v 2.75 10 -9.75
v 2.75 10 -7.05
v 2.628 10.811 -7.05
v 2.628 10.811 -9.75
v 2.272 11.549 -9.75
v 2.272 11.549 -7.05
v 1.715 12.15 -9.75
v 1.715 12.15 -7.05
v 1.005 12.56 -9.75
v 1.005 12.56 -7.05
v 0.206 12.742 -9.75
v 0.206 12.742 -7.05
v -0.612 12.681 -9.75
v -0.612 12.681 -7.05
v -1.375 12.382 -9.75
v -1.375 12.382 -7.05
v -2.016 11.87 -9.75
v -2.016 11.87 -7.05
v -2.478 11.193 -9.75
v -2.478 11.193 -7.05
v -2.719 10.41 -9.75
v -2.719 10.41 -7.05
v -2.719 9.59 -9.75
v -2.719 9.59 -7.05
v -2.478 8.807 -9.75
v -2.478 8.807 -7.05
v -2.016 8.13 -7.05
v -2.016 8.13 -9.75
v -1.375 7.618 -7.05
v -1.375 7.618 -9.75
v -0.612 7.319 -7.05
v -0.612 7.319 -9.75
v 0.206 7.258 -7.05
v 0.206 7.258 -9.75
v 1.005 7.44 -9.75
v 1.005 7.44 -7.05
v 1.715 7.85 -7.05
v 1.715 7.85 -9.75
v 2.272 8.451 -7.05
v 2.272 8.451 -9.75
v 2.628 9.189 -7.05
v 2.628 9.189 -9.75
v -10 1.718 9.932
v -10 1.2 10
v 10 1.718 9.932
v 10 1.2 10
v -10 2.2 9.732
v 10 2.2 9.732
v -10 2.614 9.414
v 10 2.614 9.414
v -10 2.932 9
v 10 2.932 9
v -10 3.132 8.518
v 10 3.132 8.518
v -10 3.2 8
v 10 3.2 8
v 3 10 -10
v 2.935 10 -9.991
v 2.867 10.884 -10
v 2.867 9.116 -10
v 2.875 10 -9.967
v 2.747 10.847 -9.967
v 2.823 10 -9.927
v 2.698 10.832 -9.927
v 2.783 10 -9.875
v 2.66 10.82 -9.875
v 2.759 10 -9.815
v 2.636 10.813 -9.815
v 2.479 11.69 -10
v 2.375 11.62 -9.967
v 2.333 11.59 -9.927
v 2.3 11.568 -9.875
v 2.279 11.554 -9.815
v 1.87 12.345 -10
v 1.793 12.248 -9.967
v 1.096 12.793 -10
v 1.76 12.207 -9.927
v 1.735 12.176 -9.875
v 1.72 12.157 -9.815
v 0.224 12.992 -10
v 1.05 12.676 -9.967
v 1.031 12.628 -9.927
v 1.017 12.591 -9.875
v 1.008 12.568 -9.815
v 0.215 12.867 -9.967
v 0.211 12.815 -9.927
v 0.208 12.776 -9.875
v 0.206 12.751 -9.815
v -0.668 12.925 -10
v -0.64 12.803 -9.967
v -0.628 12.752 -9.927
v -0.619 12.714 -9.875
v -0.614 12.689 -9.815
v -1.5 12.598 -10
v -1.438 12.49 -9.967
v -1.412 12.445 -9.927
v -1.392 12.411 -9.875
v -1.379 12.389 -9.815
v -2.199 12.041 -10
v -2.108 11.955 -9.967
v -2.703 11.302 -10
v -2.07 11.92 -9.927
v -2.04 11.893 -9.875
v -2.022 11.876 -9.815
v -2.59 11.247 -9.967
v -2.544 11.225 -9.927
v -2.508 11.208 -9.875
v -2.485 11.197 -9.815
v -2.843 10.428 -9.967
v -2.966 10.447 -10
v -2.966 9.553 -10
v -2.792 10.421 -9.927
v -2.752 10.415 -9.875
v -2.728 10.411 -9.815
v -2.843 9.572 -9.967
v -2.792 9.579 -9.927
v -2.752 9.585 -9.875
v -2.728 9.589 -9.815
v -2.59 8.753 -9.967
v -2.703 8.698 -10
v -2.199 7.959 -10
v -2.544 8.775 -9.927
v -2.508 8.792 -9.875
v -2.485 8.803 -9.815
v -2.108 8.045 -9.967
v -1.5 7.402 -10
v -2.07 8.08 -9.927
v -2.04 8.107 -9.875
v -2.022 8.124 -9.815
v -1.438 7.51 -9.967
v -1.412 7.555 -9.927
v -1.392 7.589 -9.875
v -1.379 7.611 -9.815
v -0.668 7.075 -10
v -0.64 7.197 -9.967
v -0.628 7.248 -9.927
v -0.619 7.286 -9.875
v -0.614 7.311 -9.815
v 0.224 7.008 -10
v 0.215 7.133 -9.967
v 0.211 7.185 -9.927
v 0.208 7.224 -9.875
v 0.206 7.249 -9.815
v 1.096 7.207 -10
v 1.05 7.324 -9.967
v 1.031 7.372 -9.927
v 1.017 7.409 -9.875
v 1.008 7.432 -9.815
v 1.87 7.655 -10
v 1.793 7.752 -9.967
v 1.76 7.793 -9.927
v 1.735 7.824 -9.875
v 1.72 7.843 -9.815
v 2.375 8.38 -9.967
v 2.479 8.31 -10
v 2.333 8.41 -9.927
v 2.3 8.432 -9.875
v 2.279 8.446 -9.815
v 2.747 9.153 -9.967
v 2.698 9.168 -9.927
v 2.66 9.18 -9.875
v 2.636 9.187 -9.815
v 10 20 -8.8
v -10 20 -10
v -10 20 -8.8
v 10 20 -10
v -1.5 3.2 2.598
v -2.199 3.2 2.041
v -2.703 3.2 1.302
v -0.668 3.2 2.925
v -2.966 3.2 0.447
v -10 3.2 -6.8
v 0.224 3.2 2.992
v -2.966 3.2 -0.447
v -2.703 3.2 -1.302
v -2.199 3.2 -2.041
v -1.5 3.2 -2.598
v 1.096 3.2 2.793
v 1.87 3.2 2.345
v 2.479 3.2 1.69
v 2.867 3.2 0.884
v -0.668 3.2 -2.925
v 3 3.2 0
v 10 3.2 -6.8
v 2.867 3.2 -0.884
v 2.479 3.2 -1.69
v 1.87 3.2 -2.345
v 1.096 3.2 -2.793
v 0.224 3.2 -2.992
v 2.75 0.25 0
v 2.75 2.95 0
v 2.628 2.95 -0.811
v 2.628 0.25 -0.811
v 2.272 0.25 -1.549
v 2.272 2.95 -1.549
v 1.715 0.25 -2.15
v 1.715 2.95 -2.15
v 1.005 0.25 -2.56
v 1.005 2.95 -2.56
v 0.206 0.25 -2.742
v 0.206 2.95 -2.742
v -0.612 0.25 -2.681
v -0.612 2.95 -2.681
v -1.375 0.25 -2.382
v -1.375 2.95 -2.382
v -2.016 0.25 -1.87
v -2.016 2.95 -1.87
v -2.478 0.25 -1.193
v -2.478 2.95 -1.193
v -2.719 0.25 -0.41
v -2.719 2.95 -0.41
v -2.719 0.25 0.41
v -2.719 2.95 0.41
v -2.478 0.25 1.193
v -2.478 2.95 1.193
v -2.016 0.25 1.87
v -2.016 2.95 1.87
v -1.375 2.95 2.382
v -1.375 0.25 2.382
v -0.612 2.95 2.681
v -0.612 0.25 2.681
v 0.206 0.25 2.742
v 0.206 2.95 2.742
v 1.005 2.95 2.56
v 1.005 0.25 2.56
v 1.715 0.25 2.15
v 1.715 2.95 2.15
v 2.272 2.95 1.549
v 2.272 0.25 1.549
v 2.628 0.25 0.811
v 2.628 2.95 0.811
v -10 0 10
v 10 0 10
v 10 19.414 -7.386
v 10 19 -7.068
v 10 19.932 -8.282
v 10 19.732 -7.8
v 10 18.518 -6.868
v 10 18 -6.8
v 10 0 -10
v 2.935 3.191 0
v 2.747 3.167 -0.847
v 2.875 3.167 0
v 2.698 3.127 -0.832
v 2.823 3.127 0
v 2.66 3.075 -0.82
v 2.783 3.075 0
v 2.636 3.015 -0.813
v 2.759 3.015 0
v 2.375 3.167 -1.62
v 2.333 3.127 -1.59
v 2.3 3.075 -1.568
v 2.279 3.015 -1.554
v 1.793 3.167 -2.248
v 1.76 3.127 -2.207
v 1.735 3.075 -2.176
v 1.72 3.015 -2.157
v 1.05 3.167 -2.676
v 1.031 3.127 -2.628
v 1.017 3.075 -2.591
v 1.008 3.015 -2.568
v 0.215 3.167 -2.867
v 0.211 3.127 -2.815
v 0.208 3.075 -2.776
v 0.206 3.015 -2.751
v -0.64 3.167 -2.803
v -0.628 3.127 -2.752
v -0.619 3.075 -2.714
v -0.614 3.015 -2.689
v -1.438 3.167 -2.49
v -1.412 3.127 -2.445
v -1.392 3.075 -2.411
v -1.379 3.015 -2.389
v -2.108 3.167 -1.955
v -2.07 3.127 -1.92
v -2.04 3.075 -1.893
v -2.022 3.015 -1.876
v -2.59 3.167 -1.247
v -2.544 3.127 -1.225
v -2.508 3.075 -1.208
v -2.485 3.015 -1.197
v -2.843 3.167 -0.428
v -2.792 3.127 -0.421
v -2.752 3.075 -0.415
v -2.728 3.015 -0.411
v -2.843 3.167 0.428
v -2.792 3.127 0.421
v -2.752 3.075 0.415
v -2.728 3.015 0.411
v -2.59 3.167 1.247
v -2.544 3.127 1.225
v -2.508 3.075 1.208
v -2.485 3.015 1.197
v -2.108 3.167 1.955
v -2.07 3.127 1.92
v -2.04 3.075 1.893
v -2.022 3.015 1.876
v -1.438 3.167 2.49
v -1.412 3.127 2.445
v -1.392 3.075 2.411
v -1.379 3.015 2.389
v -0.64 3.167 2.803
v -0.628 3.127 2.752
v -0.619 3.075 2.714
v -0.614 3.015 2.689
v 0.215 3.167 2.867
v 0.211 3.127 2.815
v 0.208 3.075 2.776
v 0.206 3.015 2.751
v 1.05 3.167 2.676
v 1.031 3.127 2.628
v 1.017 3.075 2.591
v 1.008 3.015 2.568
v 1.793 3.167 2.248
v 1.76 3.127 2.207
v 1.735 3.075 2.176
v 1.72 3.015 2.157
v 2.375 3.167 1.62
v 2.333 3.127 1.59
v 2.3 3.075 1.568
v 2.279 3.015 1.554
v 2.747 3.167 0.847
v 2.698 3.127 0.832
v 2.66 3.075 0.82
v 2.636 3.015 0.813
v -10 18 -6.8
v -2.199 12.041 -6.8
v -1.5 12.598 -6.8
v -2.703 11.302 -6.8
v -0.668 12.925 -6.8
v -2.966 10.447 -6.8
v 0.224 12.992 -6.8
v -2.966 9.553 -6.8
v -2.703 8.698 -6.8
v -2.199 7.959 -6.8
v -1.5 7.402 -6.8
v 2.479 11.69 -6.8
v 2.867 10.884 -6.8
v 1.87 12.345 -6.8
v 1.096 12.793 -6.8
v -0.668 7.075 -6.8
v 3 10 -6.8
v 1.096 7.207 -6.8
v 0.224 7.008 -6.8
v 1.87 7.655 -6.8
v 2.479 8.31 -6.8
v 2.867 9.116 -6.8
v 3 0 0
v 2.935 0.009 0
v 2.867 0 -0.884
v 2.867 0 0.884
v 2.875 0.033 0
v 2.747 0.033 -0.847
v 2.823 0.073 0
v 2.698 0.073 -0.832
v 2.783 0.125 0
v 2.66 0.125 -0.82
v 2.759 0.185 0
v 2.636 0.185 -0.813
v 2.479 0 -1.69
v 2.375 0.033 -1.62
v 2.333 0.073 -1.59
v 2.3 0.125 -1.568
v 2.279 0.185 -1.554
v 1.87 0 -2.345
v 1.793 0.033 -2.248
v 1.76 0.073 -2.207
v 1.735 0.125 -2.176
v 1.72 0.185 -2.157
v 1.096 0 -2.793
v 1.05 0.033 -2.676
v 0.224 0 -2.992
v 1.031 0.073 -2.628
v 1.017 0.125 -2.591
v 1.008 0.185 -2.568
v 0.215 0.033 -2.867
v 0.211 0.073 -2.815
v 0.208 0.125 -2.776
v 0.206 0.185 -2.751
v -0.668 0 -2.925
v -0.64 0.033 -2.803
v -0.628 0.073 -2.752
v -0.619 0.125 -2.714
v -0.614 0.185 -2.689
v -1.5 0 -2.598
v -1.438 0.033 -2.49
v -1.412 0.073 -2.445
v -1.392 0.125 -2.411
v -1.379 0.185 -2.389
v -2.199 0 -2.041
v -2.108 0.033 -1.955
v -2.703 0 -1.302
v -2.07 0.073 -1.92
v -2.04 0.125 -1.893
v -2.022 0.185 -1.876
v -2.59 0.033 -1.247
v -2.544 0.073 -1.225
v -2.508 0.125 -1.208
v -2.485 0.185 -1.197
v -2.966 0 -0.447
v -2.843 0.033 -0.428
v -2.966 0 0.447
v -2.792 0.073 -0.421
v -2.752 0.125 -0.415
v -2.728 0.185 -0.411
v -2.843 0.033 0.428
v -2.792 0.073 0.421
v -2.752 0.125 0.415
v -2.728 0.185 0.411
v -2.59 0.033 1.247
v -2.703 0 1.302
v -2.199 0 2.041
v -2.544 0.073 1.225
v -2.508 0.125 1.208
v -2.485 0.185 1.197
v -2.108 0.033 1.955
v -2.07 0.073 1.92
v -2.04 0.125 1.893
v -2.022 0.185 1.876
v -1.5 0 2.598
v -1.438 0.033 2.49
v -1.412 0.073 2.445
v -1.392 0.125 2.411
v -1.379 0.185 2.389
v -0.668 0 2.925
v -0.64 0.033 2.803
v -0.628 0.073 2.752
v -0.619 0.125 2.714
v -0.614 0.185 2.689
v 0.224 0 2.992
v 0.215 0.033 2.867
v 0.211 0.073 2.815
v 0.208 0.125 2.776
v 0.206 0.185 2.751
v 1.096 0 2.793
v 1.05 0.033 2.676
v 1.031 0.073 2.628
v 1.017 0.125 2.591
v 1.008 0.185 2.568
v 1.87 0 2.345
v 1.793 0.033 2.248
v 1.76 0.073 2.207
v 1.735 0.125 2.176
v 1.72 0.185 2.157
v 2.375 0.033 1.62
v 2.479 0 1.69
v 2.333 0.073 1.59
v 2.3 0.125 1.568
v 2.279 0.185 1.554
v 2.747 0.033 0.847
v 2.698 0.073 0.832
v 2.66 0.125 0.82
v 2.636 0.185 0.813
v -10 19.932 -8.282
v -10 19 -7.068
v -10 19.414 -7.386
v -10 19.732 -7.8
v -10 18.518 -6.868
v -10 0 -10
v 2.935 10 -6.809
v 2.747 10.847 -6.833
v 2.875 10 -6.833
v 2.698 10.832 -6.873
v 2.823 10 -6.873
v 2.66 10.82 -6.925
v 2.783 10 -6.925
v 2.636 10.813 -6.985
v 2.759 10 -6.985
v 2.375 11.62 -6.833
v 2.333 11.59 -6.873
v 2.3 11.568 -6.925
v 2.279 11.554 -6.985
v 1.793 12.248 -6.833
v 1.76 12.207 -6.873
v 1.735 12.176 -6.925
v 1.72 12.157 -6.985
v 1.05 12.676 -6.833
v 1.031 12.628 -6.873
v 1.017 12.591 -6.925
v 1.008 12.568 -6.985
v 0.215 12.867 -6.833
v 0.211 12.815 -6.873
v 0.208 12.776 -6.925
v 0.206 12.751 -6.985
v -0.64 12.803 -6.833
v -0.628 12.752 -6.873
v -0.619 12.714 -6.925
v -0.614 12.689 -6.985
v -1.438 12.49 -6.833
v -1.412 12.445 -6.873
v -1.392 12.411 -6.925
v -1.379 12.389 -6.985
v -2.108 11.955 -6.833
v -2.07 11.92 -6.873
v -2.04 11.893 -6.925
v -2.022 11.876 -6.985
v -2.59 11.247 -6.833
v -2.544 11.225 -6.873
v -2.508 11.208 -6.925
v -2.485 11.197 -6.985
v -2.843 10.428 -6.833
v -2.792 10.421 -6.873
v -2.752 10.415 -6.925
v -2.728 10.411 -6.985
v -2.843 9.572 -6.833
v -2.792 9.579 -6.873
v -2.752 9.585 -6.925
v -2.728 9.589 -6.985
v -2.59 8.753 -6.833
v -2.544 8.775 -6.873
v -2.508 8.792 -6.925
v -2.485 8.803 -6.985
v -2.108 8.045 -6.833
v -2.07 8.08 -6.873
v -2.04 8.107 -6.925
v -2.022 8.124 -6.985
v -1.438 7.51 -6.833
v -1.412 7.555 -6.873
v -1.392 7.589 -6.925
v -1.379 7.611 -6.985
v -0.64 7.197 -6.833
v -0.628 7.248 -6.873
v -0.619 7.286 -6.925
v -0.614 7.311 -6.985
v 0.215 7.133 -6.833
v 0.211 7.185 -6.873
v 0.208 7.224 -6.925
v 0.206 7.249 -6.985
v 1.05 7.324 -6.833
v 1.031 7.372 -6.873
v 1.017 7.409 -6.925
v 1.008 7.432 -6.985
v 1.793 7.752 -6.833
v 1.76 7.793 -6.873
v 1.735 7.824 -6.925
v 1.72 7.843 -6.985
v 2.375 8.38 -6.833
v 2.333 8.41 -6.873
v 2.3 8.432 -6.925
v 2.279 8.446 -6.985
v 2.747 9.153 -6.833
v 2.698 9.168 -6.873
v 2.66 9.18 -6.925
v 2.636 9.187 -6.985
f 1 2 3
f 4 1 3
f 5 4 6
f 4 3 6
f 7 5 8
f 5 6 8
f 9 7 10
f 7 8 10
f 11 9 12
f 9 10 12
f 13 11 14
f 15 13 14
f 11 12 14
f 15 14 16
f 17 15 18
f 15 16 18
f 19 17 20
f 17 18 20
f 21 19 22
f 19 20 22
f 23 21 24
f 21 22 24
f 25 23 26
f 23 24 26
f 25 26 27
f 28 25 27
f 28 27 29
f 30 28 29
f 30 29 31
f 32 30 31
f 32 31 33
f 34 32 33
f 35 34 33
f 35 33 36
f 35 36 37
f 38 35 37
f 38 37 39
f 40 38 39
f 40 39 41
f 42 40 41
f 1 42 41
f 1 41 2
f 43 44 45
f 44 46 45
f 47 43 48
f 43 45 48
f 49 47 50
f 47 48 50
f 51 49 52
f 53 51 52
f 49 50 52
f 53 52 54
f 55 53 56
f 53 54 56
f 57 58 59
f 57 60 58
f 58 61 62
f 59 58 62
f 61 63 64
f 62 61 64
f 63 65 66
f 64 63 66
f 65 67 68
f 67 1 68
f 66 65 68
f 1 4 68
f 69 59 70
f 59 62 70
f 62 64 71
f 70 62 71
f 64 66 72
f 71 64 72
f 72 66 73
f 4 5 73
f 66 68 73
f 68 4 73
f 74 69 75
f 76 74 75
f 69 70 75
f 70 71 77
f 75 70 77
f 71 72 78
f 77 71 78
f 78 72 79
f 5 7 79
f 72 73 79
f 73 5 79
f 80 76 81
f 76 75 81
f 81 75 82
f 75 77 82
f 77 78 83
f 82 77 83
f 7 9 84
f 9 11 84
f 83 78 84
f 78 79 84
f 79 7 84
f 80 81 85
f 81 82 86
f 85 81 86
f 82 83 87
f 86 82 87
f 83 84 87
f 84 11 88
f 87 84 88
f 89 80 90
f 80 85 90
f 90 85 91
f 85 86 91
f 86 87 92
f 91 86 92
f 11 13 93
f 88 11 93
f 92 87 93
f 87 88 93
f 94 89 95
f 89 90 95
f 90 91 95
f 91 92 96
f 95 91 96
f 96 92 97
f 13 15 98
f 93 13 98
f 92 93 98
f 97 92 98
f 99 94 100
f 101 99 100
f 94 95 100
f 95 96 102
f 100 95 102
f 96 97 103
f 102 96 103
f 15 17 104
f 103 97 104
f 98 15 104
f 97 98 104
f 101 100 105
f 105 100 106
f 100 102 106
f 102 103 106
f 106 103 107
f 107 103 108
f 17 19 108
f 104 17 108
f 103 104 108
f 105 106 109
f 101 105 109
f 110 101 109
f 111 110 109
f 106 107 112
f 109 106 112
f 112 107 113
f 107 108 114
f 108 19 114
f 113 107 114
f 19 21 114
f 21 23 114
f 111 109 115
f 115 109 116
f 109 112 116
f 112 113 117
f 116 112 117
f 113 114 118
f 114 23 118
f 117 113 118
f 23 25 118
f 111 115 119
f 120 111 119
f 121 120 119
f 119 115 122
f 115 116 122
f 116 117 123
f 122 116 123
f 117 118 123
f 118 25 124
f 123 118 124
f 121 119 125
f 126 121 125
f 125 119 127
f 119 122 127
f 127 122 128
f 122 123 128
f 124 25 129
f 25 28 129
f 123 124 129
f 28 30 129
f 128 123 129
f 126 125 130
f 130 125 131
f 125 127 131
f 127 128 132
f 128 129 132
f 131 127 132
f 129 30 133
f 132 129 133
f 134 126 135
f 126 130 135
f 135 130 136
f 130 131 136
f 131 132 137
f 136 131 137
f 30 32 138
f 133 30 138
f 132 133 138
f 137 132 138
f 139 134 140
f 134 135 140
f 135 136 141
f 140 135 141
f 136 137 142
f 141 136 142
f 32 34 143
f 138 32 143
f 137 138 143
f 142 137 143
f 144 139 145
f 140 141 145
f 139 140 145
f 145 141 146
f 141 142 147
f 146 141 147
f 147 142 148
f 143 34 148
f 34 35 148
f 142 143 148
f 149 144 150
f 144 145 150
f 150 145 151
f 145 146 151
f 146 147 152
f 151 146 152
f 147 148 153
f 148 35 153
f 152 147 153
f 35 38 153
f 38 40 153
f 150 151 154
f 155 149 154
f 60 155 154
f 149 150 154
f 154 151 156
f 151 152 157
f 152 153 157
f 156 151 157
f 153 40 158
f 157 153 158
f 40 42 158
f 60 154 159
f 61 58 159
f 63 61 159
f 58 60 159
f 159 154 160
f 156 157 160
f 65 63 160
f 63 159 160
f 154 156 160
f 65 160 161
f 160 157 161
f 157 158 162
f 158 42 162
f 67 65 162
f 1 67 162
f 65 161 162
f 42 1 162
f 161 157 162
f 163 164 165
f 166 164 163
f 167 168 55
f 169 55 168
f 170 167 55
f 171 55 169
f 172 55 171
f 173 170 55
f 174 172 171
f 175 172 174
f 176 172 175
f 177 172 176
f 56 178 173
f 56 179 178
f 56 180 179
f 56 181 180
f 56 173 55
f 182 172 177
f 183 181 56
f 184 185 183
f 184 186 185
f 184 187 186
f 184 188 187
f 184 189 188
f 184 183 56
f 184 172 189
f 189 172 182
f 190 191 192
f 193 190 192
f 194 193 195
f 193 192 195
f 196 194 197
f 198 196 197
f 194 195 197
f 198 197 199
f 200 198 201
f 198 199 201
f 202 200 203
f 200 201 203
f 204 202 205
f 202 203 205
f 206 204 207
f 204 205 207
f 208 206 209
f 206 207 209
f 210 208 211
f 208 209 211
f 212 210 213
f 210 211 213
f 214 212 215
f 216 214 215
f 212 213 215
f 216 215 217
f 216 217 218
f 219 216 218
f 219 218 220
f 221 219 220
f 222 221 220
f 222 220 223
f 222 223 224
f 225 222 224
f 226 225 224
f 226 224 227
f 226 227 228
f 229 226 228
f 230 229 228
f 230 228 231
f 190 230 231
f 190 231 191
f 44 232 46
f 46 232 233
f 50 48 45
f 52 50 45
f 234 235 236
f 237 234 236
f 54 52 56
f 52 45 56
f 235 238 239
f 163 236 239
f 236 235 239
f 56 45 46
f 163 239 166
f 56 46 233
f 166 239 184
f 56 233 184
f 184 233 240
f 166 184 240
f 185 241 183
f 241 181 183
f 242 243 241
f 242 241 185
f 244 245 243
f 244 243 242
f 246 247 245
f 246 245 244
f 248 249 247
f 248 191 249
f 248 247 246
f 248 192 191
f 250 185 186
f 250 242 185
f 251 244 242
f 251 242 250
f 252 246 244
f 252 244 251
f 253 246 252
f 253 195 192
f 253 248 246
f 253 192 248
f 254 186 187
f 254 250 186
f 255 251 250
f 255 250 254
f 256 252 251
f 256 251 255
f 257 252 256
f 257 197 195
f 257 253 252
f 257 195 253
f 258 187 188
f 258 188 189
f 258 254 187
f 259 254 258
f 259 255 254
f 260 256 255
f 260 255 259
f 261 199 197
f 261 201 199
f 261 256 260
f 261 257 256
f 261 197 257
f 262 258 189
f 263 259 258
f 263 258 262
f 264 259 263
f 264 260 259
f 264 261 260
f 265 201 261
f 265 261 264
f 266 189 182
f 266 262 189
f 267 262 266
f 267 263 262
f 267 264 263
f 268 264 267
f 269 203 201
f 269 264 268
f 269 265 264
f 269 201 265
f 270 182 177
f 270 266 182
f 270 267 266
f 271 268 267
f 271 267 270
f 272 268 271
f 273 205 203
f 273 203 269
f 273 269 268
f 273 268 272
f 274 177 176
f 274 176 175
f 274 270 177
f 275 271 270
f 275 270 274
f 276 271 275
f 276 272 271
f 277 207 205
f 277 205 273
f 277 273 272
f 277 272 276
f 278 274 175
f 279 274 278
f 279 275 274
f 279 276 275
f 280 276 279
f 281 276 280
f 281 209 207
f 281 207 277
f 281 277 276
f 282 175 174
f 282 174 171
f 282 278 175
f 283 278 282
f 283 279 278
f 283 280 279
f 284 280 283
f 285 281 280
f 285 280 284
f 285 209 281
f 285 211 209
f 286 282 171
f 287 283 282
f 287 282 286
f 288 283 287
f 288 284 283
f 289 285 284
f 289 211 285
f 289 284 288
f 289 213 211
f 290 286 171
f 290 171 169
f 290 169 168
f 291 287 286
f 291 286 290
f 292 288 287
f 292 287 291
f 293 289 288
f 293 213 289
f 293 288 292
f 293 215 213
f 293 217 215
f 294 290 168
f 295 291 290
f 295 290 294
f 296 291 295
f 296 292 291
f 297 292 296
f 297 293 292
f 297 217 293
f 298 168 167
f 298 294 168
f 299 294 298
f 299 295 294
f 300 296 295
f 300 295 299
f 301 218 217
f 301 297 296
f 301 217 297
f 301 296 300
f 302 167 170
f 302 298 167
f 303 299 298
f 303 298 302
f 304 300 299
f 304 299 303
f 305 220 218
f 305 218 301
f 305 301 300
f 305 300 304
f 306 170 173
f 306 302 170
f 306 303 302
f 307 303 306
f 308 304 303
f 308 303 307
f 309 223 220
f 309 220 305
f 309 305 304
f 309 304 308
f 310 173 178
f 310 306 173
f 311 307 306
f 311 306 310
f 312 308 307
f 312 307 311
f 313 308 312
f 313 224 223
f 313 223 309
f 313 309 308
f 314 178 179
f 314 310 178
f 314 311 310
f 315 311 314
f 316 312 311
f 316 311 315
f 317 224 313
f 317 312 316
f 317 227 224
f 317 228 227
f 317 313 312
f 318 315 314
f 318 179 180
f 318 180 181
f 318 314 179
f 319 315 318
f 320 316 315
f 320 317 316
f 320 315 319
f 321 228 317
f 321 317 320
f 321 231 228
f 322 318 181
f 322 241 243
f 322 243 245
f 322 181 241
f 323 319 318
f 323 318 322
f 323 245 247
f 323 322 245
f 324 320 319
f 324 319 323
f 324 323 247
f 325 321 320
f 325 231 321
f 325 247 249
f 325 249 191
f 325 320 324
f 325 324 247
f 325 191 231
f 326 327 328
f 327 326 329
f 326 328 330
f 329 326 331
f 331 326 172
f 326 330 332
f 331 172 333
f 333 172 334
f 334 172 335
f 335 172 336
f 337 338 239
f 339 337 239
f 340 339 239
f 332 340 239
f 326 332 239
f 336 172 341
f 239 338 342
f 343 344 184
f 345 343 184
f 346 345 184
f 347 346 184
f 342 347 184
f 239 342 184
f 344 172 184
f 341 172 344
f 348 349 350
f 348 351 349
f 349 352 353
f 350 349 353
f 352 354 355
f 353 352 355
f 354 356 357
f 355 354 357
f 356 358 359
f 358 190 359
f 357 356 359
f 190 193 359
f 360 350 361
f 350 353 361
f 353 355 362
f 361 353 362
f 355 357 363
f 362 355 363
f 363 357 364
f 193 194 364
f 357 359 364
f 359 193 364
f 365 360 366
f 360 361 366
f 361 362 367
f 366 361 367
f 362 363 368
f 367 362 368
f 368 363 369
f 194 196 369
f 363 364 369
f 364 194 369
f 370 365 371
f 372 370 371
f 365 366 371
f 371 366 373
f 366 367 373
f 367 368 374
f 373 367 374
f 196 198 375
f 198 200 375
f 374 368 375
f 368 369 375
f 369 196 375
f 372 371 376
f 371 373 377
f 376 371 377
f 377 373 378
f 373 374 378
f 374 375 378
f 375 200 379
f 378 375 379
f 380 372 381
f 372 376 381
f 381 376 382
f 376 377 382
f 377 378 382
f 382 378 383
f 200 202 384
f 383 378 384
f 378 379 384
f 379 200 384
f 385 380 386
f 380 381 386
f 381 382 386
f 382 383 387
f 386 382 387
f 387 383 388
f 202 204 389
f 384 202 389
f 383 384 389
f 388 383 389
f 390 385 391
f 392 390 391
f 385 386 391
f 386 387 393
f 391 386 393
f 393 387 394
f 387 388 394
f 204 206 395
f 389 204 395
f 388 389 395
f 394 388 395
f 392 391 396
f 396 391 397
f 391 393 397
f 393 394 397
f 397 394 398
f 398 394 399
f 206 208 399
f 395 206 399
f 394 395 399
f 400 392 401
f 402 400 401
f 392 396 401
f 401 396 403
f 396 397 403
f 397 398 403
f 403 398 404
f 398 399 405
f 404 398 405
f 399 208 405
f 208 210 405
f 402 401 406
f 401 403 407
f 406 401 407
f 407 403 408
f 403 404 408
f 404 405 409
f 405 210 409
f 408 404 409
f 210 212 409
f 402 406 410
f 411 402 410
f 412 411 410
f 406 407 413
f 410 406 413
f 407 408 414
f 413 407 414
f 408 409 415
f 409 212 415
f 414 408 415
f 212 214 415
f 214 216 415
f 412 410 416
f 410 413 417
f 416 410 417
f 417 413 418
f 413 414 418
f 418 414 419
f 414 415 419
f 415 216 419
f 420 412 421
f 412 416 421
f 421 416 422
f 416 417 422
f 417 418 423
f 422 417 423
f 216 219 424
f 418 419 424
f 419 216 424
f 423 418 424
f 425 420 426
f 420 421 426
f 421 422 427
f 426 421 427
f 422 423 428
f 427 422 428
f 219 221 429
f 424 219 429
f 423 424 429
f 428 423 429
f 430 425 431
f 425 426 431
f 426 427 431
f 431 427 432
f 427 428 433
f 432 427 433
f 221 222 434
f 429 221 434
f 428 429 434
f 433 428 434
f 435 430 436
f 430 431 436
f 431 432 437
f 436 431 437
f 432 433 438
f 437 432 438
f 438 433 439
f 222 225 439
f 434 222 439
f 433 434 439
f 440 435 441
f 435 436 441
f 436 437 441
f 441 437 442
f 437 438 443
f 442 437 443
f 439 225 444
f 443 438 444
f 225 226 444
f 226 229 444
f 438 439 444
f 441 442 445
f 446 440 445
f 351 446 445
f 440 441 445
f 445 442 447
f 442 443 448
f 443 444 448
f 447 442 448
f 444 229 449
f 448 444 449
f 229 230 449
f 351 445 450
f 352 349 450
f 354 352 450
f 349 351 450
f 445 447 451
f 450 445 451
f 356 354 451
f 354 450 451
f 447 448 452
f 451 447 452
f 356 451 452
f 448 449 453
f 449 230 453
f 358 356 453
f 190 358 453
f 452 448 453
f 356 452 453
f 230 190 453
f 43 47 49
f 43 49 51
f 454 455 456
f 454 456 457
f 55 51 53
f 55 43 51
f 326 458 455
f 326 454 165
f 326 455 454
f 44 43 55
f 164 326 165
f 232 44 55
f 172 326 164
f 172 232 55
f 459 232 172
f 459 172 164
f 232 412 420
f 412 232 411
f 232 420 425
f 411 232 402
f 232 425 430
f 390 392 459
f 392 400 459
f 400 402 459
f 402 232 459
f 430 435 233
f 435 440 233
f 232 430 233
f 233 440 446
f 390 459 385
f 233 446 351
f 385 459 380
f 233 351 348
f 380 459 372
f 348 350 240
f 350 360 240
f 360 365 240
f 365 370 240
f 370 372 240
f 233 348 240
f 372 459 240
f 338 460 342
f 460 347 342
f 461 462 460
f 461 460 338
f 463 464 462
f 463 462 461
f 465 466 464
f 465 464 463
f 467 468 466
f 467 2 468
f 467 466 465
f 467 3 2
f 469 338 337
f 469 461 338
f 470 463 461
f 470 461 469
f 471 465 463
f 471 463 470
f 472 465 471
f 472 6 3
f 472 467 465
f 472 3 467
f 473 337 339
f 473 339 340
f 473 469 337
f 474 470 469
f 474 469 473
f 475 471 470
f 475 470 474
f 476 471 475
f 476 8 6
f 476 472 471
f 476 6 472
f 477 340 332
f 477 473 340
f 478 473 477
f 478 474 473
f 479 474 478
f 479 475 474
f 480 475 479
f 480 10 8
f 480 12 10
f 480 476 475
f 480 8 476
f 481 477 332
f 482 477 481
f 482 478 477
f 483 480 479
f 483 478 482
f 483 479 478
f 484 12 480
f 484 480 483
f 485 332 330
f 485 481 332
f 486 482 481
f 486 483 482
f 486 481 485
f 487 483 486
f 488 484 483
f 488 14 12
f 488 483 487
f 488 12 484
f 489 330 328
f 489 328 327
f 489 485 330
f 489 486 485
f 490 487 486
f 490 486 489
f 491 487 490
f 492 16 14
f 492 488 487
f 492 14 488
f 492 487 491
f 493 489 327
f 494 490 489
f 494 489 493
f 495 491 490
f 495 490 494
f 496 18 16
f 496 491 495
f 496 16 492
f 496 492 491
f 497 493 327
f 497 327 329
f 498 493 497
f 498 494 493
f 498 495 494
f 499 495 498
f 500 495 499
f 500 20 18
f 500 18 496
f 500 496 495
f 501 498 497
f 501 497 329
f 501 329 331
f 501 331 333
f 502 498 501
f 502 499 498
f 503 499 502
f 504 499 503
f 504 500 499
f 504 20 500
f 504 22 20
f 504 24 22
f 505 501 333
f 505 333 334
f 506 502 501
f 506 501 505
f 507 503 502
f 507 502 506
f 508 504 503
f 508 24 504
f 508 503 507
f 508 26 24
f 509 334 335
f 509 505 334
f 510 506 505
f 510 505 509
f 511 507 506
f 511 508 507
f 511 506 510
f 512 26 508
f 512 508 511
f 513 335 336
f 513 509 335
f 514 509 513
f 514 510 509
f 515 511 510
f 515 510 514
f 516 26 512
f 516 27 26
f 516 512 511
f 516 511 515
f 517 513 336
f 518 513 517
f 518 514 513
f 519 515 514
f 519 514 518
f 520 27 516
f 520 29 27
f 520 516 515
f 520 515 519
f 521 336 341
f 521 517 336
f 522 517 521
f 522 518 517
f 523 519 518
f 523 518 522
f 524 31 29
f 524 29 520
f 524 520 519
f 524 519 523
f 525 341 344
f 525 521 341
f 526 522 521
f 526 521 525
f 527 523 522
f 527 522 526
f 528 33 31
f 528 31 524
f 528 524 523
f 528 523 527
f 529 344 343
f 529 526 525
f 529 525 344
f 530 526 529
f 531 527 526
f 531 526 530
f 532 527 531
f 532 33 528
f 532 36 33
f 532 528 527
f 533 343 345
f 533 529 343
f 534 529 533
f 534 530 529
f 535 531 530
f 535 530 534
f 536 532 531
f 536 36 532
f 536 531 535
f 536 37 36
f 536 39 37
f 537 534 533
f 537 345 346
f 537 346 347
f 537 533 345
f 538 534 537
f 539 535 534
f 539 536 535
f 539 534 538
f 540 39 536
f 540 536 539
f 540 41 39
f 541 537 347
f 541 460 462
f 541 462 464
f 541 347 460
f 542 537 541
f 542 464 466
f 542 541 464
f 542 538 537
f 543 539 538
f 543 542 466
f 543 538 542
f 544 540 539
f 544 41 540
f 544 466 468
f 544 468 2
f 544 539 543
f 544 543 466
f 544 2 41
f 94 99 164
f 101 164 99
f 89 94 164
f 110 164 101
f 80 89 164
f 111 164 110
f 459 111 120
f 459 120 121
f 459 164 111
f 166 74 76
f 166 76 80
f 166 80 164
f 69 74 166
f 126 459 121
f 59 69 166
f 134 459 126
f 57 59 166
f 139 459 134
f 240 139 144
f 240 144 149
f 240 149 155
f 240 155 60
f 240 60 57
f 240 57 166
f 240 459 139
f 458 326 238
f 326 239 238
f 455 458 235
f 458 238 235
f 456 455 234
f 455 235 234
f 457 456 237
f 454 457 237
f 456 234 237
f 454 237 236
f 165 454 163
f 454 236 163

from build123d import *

# Parameters (mm, degrees)
SKETCH1_W           = 20
SKETCH1_H           = 20
BOSS_EXTRUDE1_DEPTH = 3.2
SKETCH2_W           = 20
SKETCH2_H           = 3.2
BOSS_EXTRUDE2_DEPTH = 16.8
SKETCH3_R           = 2.75
CUT_EXTRUDE1_DEPTH  = 4.2
SKETCH4_R           = 2.75
CUT_EXTRUDE2_DEPTH  = 4.2
FILLET1_R           = 2
FILLET2_R           = 0.25


with BuildPart() as part:
    # Sketch1 → Boss-Extrude1 (new body)
    with BuildSketch(Plane(origin=(0, 0, 0), x_dir=(1, 0, 0), z_dir=(0, 1, 0))):
        Rectangle(SKETCH1_W, SKETCH1_H)
    extrude(amount=BOSS_EXTRUDE1_DEPTH)

    # Sketch2 → Boss-Extrude2 (add)
    with BuildSketch(Plane(origin=(0, 3.2, 0), x_dir=(1, 0, 0), z_dir=(0, 1, 0))):
        with Locations((0, 8.4)):
            Rectangle(SKETCH2_W, SKETCH2_H)
    extrude(amount=BOSS_EXTRUDE2_DEPTH)

    # Sketch3 → Cut-Extrude1 (cut, through all)
    with BuildSketch(Plane(origin=(0, 3.2, 0), x_dir=(1, 0, 0), z_dir=(0, 1, 0))):
        Circle(SKETCH3_R)
    extrude(amount=-CUT_EXTRUDE1_DEPTH, mode=Mode.SUBTRACT)

    # Sketch4 → Cut-Extrude2 (cut, through all)
    with BuildSketch(Plane.XY.offset(-6.8)):
        with Locations((0, 10)):
            Circle(SKETCH4_R)
    extrude(amount=-CUT_EXTRUDE2_DEPTH, mode=Mode.SUBTRACT)

    # Fillet1
    fillet1_edges = [part.edges().sort_by_distance(p)[0] for p in [
        (0, 3.2, 10),
        (0, 20, -6.8),
    ]]
    fillet(fillet1_edges, radius=FILLET1_R)

    # Fillet2
    fillet2_edges = [part.edges().sort_by_distance(p)[0] for p in [
        (-2.75, 0, 0),
        (-2.75, 3.2, 0),
        (-2.75, 10, -10),
        (-2.75, 10, -6.8),
    ]]
    fillet(fillet2_edges, radius=FILLET2_R)


solid = part.part
